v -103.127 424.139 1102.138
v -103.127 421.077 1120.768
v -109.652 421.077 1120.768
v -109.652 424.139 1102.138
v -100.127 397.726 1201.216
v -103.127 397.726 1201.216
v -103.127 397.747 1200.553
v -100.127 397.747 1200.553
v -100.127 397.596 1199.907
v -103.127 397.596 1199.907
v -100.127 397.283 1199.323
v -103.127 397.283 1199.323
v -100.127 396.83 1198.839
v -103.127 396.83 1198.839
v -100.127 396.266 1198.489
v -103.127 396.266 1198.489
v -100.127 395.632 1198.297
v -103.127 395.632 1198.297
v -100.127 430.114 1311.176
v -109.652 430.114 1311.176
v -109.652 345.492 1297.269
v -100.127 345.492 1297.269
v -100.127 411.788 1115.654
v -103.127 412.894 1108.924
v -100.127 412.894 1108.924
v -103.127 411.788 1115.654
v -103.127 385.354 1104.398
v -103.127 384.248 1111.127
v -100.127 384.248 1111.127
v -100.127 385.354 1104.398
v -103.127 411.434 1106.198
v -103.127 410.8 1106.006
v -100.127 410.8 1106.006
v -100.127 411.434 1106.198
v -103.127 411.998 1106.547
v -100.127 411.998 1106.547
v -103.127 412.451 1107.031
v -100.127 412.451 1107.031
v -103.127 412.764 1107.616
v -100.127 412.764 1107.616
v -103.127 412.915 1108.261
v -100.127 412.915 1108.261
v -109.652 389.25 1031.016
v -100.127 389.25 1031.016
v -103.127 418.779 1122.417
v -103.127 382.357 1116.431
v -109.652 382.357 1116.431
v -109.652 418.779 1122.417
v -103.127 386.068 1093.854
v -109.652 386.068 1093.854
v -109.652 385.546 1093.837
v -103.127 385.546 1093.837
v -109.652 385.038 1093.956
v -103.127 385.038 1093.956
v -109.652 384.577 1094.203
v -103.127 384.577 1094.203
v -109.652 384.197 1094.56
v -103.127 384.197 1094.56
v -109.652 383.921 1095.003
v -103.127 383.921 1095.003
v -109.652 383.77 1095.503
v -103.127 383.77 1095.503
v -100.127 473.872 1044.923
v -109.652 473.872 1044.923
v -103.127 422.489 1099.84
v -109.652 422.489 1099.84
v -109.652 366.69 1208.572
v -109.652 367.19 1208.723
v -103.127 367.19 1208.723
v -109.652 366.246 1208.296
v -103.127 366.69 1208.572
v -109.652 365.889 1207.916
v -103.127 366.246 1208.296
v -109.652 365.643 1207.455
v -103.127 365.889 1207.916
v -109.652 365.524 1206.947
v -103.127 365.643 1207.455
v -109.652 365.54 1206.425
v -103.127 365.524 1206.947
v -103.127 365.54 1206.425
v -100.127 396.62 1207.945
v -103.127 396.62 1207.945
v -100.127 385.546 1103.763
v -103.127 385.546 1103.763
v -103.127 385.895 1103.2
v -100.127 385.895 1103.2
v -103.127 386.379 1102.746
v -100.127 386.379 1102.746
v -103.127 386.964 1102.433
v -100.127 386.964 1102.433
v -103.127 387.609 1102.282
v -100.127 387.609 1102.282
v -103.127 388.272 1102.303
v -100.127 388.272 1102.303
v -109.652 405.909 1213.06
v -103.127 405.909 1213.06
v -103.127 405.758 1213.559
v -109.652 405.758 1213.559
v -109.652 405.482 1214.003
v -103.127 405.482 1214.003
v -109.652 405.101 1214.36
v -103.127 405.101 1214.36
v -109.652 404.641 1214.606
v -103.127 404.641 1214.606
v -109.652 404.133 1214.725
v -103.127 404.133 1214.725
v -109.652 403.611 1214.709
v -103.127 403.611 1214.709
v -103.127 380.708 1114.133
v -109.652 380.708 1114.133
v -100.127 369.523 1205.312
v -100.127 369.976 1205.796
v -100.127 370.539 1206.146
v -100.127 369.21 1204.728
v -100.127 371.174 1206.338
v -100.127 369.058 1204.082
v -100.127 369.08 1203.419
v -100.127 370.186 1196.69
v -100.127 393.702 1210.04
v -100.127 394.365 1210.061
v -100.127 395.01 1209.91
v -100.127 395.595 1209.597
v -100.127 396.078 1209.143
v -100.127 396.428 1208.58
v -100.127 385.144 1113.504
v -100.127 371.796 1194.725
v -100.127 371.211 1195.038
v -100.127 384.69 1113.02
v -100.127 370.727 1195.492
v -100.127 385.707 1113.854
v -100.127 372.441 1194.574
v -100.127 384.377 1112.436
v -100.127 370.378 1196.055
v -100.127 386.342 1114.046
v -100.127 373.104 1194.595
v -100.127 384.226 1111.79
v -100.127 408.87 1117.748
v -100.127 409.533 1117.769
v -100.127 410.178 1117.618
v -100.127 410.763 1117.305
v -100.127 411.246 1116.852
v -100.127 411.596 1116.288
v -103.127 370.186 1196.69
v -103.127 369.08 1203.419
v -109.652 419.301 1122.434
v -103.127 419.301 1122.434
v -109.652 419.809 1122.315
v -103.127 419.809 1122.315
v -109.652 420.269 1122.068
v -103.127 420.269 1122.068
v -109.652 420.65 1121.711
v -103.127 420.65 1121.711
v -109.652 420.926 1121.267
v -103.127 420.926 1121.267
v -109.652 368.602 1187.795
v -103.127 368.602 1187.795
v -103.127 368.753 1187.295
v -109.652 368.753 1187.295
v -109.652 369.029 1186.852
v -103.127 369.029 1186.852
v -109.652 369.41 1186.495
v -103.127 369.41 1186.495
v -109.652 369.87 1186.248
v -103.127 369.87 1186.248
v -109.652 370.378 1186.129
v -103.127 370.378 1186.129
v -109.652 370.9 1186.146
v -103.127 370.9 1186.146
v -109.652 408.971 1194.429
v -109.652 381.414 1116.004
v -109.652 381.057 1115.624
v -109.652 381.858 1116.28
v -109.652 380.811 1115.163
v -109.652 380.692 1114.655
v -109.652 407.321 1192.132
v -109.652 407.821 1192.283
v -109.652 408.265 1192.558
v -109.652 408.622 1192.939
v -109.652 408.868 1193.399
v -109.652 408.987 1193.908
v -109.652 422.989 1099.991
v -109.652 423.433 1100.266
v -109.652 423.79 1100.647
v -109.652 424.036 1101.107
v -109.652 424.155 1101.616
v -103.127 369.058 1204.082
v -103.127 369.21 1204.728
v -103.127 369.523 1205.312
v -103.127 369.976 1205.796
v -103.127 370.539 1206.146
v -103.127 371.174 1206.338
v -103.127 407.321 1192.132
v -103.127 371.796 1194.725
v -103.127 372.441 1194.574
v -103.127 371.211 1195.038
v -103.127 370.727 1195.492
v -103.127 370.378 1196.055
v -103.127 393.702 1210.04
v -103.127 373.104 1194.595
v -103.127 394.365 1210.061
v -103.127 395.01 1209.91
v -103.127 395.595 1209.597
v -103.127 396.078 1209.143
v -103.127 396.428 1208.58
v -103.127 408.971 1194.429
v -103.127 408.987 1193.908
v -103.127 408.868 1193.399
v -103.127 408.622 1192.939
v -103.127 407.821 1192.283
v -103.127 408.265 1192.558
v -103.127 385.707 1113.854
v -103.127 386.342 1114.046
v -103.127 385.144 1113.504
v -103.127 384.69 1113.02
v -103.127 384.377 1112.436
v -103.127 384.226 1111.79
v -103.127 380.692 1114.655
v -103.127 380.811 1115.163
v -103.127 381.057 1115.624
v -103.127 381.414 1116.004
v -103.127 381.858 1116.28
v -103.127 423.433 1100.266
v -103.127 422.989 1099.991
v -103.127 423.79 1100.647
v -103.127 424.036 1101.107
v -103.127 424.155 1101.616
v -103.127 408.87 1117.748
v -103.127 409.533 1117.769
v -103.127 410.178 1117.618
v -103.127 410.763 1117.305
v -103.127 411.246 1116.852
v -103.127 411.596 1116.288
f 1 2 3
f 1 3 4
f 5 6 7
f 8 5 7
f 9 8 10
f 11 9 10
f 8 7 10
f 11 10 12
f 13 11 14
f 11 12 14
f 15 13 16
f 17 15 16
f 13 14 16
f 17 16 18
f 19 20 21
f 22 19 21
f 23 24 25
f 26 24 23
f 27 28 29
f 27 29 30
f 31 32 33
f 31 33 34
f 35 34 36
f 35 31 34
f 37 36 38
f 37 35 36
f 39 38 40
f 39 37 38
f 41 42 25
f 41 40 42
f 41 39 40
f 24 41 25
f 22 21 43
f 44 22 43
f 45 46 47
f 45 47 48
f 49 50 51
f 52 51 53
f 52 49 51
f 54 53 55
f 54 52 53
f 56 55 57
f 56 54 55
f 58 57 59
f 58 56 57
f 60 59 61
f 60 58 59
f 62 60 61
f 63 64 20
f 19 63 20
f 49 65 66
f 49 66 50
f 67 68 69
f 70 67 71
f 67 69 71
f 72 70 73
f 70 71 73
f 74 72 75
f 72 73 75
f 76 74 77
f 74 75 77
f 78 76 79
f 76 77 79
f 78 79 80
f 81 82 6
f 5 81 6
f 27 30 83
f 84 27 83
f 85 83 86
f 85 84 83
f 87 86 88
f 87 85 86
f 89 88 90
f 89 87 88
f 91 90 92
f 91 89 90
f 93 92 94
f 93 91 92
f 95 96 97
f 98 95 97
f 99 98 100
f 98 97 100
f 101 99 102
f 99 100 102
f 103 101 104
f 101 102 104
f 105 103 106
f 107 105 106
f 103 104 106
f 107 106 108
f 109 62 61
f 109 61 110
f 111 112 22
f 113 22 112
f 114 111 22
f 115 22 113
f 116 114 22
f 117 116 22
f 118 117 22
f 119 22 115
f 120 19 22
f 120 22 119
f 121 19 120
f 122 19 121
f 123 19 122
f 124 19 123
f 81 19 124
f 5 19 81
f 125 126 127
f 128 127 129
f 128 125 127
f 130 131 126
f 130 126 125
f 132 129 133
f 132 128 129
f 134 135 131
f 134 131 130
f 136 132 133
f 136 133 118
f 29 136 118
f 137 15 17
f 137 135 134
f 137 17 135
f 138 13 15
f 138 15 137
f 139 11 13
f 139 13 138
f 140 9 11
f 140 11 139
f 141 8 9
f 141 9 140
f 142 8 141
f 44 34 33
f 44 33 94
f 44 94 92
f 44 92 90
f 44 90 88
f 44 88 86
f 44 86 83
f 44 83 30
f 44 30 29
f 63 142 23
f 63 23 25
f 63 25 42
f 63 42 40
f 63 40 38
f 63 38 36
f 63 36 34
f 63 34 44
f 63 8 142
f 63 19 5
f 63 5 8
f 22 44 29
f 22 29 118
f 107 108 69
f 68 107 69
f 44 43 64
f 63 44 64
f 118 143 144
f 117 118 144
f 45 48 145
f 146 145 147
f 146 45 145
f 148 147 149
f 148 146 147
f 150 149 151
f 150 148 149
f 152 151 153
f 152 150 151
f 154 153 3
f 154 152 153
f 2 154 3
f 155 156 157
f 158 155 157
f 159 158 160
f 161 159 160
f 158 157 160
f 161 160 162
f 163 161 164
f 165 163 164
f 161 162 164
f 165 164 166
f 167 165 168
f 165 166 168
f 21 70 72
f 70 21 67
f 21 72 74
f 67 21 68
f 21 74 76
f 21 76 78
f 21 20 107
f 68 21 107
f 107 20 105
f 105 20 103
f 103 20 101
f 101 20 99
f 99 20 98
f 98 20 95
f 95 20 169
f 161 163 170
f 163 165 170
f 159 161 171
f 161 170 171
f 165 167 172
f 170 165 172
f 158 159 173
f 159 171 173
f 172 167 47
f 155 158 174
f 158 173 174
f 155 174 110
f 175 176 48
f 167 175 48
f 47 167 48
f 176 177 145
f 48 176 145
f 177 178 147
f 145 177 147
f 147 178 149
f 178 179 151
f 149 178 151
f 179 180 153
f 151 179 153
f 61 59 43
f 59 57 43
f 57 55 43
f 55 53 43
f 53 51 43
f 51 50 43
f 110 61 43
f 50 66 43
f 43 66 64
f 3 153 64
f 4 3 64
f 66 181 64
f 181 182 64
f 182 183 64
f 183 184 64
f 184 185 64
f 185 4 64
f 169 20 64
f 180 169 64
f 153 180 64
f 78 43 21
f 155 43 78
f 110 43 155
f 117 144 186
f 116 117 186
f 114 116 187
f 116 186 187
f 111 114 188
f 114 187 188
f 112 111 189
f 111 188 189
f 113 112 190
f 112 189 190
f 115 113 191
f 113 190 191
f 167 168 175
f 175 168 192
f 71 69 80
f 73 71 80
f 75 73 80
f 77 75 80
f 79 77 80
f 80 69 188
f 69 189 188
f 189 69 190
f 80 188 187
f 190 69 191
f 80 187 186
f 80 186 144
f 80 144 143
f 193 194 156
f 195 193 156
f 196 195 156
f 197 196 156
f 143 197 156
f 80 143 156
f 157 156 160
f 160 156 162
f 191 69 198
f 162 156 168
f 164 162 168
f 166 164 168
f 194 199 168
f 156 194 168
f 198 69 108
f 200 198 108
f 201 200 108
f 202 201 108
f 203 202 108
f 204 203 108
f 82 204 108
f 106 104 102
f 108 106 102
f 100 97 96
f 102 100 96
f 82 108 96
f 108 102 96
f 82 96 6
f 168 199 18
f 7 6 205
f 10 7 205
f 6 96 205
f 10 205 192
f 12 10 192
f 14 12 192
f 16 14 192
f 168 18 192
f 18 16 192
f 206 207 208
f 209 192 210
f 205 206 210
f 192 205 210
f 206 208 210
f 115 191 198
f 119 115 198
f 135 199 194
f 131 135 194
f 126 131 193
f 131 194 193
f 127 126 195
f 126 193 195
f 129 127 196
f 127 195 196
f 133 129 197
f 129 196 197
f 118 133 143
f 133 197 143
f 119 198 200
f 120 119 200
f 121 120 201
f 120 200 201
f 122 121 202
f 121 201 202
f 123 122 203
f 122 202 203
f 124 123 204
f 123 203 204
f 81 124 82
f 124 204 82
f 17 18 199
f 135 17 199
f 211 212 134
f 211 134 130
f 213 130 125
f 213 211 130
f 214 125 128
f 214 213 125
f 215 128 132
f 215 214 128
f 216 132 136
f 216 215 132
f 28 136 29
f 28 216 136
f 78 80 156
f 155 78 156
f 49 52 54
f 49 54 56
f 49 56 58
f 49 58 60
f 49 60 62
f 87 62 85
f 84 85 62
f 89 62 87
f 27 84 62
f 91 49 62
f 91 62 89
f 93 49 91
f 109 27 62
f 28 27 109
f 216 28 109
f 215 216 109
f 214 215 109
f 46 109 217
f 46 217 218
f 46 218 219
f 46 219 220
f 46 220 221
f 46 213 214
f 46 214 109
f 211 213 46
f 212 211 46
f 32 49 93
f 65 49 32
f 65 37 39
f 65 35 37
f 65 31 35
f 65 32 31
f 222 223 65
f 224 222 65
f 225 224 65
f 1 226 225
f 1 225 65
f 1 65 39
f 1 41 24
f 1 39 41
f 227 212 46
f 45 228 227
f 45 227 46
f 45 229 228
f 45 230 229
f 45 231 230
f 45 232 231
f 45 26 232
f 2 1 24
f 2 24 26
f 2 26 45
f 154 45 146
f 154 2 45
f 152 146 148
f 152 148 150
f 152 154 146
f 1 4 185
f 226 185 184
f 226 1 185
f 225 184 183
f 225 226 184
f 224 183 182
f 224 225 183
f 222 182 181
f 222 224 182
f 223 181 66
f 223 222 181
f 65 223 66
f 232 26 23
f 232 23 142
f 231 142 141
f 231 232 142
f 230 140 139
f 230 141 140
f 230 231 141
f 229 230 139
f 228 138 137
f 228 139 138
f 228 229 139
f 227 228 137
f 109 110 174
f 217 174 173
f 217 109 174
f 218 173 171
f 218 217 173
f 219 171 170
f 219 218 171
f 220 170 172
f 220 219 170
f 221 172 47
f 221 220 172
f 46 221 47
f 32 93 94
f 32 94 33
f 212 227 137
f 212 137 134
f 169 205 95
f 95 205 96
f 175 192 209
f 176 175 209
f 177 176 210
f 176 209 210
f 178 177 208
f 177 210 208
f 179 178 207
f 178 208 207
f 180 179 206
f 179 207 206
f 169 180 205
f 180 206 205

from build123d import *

# Parameters (mm, degrees)
BOSS_EXTRUDE1_START     = -109.652
BOSS_EXTRUDE1_DEPTH     = 9.525
CUT_EXTRUDE1_DEPTH      = 1399.485644649
CUT_EXTRUDE1_DEPTH_BACK = 1399.485644649
CUT_EXTRUDE2_START      = -103.127
CUT_EXTRUDE2_DEPTH      = 1296.358644649


with BuildPart() as part:
    # Sketch1 → Boss-Extrude1 (new body)
    with BuildSketch(Plane(origin=(0, 0, 0), x_dir=(0, 0, -1), z_dir=(1, 0, 0)).offset(BOSS_EXTRUDE1_START)):
        Polygon((-1044.923144897, 473.87249639), (-1311.176339914, 430.114447736), (-1297.268878193, 345.492161514), (-1031.015683176, 389.250210169), align=None)
    extrude(amount=BOSS_EXTRUDE1_DEPTH)

    # Sketch2 → Cut-Extrude1 (cut, two sides: drawn at the far end of the back side and taken through both)
    with BuildSketch(Plane(origin=(0, 0, 0), x_dir=(0, 0, -1), z_dir=(1, 0, 0)).offset(-CUT_EXTRUDE1_DEPTH_BACK)):
        with BuildLine():
            Line((-1108.923879409, 412.894172152), (-1115.653599818, 411.788159384))
            ThreePointArc((-1115.653599818, 411.788159384), (-1117.305228207, 410.762789477), (-1117.748059826, 408.869865828))
            Line((-1117.748059826, 408.869865828), (-1114.045674009, 386.34207761))
            ThreePointArc((-1114.045674009, 386.34207761), (-1113.020304102, 384.690449222), (-1111.127380454, 384.247617603))
            Line((-1111.127380454, 384.247617603), (-1104.397660044, 385.35363037))
            ThreePointArc((-1104.397660044, 385.35363037), (-1102.746031655, 386.379000278), (-1102.303200036, 388.271923926))
            Line((-1102.303200036, 388.271923926), (-1106.005585853, 410.799712144))
            ThreePointArc((-1106.005585853, 410.799712144), (-1107.03095576, 412.451340533), (-1108.923879409, 412.894172152))
        make_face()
        with BuildLine():
            Line((-1206.337571934, 371.174134332), (-1210.039957751, 393.70192255))
            ThreePointArc((-1210.039957751, 393.70192255), (-1209.597126132, 395.594846198), (-1207.945497743, 396.620216105))
            Line((-1207.945497743, 396.620216105), (-1201.215777333, 397.726228873))
            ThreePointArc((-1201.215777333, 397.726228873), (-1199.322853685, 397.283397254), (-1198.297483778, 395.631768865))
            Line((-1198.297483778, 395.631768865), (-1194.595097961, 373.103980647))
            ThreePointArc((-1194.595097961, 373.103980647), (-1195.03792958, 371.211056999), (-1196.689557968, 370.185687092))
            Line((-1196.689557968, 370.185687092), (-1203.419278378, 369.079674324))
            ThreePointArc((-1203.419278378, 369.079674324), (-1205.312202026, 369.522505943), (-1206.337571934, 371.174134332))
        make_face()
    extrude(amount=CUT_EXTRUDE1_DEPTH + CUT_EXTRUDE1_DEPTH_BACK, mode=Mode.SUBTRACT)

    # Sketch3 → Cut-Extrude2 (cut, through all)
    with BuildSketch(Plane(origin=(0, 0, 0), x_dir=(0, 0, -1), z_dir=(1, 0, 0)).offset(CUT_EXTRUDE2_START)):
        with BuildLine():
            Line((-1095.503116711, 383.770114016), (-1114.13319278, 380.708307472))
            ThreePointArc((-1114.13319278, 380.708307472), (-1115.623683889, 381.056993797), (-1116.431061795, 382.357488633))
            Line((-1116.431061795, 382.357488633), (-1122.416828748, 418.778892809))
            ThreePointArc((-1122.416828748, 418.778892809), (-1122.068142423, 420.269383918), (-1120.767647587, 421.076761824))
            Line((-1120.767647587, 421.076761824), (-1102.137571518, 424.138568369))
            ThreePointArc((-1102.137571518, 424.138568369), (-1100.647080409, 423.789882043), (-1099.839702503, 422.489387207))
            Line((-1099.839702503, 422.489387207), (-1093.85393555, 386.067983031))
            ThreePointArc((-1093.85393555, 386.067983031), (-1094.202621875, 384.577491922), (-1095.503116711, 383.770114016))
        make_face()
        with BuildLine():
            Line((-1194.429469443, 408.97062509), (-1213.059545512, 405.908818545))
            ThreePointArc((-1213.059545512, 405.908818545), (-1214.360040348, 405.10144064), (-1214.708726673, 403.61094953))
            Line((-1214.708726673, 403.61094953), (-1208.722959719, 367.189545354))
            ThreePointArc((-1208.722959719, 367.189545354), (-1207.915581814, 365.889050518), (-1206.425090705, 365.540364193))
            Line((-1206.425090705, 365.540364193), (-1187.795014635, 368.602170738))
            ThreePointArc((-1187.795014635, 368.602170738), (-1186.4945198, 369.409548643), (-1186.145833474, 370.900039753))
            Line((-1186.145833474, 370.900039753), (-1192.131600428, 407.321443929))
            ThreePointArc((-1192.131600428, 407.321443929), (-1192.938978333, 408.621938765), (-1194.429469443, 408.97062509))
        make_face()
    extrude(amount=-CUT_EXTRUDE2_DEPTH, mode=Mode.SUBTRACT)


solid = part.part
